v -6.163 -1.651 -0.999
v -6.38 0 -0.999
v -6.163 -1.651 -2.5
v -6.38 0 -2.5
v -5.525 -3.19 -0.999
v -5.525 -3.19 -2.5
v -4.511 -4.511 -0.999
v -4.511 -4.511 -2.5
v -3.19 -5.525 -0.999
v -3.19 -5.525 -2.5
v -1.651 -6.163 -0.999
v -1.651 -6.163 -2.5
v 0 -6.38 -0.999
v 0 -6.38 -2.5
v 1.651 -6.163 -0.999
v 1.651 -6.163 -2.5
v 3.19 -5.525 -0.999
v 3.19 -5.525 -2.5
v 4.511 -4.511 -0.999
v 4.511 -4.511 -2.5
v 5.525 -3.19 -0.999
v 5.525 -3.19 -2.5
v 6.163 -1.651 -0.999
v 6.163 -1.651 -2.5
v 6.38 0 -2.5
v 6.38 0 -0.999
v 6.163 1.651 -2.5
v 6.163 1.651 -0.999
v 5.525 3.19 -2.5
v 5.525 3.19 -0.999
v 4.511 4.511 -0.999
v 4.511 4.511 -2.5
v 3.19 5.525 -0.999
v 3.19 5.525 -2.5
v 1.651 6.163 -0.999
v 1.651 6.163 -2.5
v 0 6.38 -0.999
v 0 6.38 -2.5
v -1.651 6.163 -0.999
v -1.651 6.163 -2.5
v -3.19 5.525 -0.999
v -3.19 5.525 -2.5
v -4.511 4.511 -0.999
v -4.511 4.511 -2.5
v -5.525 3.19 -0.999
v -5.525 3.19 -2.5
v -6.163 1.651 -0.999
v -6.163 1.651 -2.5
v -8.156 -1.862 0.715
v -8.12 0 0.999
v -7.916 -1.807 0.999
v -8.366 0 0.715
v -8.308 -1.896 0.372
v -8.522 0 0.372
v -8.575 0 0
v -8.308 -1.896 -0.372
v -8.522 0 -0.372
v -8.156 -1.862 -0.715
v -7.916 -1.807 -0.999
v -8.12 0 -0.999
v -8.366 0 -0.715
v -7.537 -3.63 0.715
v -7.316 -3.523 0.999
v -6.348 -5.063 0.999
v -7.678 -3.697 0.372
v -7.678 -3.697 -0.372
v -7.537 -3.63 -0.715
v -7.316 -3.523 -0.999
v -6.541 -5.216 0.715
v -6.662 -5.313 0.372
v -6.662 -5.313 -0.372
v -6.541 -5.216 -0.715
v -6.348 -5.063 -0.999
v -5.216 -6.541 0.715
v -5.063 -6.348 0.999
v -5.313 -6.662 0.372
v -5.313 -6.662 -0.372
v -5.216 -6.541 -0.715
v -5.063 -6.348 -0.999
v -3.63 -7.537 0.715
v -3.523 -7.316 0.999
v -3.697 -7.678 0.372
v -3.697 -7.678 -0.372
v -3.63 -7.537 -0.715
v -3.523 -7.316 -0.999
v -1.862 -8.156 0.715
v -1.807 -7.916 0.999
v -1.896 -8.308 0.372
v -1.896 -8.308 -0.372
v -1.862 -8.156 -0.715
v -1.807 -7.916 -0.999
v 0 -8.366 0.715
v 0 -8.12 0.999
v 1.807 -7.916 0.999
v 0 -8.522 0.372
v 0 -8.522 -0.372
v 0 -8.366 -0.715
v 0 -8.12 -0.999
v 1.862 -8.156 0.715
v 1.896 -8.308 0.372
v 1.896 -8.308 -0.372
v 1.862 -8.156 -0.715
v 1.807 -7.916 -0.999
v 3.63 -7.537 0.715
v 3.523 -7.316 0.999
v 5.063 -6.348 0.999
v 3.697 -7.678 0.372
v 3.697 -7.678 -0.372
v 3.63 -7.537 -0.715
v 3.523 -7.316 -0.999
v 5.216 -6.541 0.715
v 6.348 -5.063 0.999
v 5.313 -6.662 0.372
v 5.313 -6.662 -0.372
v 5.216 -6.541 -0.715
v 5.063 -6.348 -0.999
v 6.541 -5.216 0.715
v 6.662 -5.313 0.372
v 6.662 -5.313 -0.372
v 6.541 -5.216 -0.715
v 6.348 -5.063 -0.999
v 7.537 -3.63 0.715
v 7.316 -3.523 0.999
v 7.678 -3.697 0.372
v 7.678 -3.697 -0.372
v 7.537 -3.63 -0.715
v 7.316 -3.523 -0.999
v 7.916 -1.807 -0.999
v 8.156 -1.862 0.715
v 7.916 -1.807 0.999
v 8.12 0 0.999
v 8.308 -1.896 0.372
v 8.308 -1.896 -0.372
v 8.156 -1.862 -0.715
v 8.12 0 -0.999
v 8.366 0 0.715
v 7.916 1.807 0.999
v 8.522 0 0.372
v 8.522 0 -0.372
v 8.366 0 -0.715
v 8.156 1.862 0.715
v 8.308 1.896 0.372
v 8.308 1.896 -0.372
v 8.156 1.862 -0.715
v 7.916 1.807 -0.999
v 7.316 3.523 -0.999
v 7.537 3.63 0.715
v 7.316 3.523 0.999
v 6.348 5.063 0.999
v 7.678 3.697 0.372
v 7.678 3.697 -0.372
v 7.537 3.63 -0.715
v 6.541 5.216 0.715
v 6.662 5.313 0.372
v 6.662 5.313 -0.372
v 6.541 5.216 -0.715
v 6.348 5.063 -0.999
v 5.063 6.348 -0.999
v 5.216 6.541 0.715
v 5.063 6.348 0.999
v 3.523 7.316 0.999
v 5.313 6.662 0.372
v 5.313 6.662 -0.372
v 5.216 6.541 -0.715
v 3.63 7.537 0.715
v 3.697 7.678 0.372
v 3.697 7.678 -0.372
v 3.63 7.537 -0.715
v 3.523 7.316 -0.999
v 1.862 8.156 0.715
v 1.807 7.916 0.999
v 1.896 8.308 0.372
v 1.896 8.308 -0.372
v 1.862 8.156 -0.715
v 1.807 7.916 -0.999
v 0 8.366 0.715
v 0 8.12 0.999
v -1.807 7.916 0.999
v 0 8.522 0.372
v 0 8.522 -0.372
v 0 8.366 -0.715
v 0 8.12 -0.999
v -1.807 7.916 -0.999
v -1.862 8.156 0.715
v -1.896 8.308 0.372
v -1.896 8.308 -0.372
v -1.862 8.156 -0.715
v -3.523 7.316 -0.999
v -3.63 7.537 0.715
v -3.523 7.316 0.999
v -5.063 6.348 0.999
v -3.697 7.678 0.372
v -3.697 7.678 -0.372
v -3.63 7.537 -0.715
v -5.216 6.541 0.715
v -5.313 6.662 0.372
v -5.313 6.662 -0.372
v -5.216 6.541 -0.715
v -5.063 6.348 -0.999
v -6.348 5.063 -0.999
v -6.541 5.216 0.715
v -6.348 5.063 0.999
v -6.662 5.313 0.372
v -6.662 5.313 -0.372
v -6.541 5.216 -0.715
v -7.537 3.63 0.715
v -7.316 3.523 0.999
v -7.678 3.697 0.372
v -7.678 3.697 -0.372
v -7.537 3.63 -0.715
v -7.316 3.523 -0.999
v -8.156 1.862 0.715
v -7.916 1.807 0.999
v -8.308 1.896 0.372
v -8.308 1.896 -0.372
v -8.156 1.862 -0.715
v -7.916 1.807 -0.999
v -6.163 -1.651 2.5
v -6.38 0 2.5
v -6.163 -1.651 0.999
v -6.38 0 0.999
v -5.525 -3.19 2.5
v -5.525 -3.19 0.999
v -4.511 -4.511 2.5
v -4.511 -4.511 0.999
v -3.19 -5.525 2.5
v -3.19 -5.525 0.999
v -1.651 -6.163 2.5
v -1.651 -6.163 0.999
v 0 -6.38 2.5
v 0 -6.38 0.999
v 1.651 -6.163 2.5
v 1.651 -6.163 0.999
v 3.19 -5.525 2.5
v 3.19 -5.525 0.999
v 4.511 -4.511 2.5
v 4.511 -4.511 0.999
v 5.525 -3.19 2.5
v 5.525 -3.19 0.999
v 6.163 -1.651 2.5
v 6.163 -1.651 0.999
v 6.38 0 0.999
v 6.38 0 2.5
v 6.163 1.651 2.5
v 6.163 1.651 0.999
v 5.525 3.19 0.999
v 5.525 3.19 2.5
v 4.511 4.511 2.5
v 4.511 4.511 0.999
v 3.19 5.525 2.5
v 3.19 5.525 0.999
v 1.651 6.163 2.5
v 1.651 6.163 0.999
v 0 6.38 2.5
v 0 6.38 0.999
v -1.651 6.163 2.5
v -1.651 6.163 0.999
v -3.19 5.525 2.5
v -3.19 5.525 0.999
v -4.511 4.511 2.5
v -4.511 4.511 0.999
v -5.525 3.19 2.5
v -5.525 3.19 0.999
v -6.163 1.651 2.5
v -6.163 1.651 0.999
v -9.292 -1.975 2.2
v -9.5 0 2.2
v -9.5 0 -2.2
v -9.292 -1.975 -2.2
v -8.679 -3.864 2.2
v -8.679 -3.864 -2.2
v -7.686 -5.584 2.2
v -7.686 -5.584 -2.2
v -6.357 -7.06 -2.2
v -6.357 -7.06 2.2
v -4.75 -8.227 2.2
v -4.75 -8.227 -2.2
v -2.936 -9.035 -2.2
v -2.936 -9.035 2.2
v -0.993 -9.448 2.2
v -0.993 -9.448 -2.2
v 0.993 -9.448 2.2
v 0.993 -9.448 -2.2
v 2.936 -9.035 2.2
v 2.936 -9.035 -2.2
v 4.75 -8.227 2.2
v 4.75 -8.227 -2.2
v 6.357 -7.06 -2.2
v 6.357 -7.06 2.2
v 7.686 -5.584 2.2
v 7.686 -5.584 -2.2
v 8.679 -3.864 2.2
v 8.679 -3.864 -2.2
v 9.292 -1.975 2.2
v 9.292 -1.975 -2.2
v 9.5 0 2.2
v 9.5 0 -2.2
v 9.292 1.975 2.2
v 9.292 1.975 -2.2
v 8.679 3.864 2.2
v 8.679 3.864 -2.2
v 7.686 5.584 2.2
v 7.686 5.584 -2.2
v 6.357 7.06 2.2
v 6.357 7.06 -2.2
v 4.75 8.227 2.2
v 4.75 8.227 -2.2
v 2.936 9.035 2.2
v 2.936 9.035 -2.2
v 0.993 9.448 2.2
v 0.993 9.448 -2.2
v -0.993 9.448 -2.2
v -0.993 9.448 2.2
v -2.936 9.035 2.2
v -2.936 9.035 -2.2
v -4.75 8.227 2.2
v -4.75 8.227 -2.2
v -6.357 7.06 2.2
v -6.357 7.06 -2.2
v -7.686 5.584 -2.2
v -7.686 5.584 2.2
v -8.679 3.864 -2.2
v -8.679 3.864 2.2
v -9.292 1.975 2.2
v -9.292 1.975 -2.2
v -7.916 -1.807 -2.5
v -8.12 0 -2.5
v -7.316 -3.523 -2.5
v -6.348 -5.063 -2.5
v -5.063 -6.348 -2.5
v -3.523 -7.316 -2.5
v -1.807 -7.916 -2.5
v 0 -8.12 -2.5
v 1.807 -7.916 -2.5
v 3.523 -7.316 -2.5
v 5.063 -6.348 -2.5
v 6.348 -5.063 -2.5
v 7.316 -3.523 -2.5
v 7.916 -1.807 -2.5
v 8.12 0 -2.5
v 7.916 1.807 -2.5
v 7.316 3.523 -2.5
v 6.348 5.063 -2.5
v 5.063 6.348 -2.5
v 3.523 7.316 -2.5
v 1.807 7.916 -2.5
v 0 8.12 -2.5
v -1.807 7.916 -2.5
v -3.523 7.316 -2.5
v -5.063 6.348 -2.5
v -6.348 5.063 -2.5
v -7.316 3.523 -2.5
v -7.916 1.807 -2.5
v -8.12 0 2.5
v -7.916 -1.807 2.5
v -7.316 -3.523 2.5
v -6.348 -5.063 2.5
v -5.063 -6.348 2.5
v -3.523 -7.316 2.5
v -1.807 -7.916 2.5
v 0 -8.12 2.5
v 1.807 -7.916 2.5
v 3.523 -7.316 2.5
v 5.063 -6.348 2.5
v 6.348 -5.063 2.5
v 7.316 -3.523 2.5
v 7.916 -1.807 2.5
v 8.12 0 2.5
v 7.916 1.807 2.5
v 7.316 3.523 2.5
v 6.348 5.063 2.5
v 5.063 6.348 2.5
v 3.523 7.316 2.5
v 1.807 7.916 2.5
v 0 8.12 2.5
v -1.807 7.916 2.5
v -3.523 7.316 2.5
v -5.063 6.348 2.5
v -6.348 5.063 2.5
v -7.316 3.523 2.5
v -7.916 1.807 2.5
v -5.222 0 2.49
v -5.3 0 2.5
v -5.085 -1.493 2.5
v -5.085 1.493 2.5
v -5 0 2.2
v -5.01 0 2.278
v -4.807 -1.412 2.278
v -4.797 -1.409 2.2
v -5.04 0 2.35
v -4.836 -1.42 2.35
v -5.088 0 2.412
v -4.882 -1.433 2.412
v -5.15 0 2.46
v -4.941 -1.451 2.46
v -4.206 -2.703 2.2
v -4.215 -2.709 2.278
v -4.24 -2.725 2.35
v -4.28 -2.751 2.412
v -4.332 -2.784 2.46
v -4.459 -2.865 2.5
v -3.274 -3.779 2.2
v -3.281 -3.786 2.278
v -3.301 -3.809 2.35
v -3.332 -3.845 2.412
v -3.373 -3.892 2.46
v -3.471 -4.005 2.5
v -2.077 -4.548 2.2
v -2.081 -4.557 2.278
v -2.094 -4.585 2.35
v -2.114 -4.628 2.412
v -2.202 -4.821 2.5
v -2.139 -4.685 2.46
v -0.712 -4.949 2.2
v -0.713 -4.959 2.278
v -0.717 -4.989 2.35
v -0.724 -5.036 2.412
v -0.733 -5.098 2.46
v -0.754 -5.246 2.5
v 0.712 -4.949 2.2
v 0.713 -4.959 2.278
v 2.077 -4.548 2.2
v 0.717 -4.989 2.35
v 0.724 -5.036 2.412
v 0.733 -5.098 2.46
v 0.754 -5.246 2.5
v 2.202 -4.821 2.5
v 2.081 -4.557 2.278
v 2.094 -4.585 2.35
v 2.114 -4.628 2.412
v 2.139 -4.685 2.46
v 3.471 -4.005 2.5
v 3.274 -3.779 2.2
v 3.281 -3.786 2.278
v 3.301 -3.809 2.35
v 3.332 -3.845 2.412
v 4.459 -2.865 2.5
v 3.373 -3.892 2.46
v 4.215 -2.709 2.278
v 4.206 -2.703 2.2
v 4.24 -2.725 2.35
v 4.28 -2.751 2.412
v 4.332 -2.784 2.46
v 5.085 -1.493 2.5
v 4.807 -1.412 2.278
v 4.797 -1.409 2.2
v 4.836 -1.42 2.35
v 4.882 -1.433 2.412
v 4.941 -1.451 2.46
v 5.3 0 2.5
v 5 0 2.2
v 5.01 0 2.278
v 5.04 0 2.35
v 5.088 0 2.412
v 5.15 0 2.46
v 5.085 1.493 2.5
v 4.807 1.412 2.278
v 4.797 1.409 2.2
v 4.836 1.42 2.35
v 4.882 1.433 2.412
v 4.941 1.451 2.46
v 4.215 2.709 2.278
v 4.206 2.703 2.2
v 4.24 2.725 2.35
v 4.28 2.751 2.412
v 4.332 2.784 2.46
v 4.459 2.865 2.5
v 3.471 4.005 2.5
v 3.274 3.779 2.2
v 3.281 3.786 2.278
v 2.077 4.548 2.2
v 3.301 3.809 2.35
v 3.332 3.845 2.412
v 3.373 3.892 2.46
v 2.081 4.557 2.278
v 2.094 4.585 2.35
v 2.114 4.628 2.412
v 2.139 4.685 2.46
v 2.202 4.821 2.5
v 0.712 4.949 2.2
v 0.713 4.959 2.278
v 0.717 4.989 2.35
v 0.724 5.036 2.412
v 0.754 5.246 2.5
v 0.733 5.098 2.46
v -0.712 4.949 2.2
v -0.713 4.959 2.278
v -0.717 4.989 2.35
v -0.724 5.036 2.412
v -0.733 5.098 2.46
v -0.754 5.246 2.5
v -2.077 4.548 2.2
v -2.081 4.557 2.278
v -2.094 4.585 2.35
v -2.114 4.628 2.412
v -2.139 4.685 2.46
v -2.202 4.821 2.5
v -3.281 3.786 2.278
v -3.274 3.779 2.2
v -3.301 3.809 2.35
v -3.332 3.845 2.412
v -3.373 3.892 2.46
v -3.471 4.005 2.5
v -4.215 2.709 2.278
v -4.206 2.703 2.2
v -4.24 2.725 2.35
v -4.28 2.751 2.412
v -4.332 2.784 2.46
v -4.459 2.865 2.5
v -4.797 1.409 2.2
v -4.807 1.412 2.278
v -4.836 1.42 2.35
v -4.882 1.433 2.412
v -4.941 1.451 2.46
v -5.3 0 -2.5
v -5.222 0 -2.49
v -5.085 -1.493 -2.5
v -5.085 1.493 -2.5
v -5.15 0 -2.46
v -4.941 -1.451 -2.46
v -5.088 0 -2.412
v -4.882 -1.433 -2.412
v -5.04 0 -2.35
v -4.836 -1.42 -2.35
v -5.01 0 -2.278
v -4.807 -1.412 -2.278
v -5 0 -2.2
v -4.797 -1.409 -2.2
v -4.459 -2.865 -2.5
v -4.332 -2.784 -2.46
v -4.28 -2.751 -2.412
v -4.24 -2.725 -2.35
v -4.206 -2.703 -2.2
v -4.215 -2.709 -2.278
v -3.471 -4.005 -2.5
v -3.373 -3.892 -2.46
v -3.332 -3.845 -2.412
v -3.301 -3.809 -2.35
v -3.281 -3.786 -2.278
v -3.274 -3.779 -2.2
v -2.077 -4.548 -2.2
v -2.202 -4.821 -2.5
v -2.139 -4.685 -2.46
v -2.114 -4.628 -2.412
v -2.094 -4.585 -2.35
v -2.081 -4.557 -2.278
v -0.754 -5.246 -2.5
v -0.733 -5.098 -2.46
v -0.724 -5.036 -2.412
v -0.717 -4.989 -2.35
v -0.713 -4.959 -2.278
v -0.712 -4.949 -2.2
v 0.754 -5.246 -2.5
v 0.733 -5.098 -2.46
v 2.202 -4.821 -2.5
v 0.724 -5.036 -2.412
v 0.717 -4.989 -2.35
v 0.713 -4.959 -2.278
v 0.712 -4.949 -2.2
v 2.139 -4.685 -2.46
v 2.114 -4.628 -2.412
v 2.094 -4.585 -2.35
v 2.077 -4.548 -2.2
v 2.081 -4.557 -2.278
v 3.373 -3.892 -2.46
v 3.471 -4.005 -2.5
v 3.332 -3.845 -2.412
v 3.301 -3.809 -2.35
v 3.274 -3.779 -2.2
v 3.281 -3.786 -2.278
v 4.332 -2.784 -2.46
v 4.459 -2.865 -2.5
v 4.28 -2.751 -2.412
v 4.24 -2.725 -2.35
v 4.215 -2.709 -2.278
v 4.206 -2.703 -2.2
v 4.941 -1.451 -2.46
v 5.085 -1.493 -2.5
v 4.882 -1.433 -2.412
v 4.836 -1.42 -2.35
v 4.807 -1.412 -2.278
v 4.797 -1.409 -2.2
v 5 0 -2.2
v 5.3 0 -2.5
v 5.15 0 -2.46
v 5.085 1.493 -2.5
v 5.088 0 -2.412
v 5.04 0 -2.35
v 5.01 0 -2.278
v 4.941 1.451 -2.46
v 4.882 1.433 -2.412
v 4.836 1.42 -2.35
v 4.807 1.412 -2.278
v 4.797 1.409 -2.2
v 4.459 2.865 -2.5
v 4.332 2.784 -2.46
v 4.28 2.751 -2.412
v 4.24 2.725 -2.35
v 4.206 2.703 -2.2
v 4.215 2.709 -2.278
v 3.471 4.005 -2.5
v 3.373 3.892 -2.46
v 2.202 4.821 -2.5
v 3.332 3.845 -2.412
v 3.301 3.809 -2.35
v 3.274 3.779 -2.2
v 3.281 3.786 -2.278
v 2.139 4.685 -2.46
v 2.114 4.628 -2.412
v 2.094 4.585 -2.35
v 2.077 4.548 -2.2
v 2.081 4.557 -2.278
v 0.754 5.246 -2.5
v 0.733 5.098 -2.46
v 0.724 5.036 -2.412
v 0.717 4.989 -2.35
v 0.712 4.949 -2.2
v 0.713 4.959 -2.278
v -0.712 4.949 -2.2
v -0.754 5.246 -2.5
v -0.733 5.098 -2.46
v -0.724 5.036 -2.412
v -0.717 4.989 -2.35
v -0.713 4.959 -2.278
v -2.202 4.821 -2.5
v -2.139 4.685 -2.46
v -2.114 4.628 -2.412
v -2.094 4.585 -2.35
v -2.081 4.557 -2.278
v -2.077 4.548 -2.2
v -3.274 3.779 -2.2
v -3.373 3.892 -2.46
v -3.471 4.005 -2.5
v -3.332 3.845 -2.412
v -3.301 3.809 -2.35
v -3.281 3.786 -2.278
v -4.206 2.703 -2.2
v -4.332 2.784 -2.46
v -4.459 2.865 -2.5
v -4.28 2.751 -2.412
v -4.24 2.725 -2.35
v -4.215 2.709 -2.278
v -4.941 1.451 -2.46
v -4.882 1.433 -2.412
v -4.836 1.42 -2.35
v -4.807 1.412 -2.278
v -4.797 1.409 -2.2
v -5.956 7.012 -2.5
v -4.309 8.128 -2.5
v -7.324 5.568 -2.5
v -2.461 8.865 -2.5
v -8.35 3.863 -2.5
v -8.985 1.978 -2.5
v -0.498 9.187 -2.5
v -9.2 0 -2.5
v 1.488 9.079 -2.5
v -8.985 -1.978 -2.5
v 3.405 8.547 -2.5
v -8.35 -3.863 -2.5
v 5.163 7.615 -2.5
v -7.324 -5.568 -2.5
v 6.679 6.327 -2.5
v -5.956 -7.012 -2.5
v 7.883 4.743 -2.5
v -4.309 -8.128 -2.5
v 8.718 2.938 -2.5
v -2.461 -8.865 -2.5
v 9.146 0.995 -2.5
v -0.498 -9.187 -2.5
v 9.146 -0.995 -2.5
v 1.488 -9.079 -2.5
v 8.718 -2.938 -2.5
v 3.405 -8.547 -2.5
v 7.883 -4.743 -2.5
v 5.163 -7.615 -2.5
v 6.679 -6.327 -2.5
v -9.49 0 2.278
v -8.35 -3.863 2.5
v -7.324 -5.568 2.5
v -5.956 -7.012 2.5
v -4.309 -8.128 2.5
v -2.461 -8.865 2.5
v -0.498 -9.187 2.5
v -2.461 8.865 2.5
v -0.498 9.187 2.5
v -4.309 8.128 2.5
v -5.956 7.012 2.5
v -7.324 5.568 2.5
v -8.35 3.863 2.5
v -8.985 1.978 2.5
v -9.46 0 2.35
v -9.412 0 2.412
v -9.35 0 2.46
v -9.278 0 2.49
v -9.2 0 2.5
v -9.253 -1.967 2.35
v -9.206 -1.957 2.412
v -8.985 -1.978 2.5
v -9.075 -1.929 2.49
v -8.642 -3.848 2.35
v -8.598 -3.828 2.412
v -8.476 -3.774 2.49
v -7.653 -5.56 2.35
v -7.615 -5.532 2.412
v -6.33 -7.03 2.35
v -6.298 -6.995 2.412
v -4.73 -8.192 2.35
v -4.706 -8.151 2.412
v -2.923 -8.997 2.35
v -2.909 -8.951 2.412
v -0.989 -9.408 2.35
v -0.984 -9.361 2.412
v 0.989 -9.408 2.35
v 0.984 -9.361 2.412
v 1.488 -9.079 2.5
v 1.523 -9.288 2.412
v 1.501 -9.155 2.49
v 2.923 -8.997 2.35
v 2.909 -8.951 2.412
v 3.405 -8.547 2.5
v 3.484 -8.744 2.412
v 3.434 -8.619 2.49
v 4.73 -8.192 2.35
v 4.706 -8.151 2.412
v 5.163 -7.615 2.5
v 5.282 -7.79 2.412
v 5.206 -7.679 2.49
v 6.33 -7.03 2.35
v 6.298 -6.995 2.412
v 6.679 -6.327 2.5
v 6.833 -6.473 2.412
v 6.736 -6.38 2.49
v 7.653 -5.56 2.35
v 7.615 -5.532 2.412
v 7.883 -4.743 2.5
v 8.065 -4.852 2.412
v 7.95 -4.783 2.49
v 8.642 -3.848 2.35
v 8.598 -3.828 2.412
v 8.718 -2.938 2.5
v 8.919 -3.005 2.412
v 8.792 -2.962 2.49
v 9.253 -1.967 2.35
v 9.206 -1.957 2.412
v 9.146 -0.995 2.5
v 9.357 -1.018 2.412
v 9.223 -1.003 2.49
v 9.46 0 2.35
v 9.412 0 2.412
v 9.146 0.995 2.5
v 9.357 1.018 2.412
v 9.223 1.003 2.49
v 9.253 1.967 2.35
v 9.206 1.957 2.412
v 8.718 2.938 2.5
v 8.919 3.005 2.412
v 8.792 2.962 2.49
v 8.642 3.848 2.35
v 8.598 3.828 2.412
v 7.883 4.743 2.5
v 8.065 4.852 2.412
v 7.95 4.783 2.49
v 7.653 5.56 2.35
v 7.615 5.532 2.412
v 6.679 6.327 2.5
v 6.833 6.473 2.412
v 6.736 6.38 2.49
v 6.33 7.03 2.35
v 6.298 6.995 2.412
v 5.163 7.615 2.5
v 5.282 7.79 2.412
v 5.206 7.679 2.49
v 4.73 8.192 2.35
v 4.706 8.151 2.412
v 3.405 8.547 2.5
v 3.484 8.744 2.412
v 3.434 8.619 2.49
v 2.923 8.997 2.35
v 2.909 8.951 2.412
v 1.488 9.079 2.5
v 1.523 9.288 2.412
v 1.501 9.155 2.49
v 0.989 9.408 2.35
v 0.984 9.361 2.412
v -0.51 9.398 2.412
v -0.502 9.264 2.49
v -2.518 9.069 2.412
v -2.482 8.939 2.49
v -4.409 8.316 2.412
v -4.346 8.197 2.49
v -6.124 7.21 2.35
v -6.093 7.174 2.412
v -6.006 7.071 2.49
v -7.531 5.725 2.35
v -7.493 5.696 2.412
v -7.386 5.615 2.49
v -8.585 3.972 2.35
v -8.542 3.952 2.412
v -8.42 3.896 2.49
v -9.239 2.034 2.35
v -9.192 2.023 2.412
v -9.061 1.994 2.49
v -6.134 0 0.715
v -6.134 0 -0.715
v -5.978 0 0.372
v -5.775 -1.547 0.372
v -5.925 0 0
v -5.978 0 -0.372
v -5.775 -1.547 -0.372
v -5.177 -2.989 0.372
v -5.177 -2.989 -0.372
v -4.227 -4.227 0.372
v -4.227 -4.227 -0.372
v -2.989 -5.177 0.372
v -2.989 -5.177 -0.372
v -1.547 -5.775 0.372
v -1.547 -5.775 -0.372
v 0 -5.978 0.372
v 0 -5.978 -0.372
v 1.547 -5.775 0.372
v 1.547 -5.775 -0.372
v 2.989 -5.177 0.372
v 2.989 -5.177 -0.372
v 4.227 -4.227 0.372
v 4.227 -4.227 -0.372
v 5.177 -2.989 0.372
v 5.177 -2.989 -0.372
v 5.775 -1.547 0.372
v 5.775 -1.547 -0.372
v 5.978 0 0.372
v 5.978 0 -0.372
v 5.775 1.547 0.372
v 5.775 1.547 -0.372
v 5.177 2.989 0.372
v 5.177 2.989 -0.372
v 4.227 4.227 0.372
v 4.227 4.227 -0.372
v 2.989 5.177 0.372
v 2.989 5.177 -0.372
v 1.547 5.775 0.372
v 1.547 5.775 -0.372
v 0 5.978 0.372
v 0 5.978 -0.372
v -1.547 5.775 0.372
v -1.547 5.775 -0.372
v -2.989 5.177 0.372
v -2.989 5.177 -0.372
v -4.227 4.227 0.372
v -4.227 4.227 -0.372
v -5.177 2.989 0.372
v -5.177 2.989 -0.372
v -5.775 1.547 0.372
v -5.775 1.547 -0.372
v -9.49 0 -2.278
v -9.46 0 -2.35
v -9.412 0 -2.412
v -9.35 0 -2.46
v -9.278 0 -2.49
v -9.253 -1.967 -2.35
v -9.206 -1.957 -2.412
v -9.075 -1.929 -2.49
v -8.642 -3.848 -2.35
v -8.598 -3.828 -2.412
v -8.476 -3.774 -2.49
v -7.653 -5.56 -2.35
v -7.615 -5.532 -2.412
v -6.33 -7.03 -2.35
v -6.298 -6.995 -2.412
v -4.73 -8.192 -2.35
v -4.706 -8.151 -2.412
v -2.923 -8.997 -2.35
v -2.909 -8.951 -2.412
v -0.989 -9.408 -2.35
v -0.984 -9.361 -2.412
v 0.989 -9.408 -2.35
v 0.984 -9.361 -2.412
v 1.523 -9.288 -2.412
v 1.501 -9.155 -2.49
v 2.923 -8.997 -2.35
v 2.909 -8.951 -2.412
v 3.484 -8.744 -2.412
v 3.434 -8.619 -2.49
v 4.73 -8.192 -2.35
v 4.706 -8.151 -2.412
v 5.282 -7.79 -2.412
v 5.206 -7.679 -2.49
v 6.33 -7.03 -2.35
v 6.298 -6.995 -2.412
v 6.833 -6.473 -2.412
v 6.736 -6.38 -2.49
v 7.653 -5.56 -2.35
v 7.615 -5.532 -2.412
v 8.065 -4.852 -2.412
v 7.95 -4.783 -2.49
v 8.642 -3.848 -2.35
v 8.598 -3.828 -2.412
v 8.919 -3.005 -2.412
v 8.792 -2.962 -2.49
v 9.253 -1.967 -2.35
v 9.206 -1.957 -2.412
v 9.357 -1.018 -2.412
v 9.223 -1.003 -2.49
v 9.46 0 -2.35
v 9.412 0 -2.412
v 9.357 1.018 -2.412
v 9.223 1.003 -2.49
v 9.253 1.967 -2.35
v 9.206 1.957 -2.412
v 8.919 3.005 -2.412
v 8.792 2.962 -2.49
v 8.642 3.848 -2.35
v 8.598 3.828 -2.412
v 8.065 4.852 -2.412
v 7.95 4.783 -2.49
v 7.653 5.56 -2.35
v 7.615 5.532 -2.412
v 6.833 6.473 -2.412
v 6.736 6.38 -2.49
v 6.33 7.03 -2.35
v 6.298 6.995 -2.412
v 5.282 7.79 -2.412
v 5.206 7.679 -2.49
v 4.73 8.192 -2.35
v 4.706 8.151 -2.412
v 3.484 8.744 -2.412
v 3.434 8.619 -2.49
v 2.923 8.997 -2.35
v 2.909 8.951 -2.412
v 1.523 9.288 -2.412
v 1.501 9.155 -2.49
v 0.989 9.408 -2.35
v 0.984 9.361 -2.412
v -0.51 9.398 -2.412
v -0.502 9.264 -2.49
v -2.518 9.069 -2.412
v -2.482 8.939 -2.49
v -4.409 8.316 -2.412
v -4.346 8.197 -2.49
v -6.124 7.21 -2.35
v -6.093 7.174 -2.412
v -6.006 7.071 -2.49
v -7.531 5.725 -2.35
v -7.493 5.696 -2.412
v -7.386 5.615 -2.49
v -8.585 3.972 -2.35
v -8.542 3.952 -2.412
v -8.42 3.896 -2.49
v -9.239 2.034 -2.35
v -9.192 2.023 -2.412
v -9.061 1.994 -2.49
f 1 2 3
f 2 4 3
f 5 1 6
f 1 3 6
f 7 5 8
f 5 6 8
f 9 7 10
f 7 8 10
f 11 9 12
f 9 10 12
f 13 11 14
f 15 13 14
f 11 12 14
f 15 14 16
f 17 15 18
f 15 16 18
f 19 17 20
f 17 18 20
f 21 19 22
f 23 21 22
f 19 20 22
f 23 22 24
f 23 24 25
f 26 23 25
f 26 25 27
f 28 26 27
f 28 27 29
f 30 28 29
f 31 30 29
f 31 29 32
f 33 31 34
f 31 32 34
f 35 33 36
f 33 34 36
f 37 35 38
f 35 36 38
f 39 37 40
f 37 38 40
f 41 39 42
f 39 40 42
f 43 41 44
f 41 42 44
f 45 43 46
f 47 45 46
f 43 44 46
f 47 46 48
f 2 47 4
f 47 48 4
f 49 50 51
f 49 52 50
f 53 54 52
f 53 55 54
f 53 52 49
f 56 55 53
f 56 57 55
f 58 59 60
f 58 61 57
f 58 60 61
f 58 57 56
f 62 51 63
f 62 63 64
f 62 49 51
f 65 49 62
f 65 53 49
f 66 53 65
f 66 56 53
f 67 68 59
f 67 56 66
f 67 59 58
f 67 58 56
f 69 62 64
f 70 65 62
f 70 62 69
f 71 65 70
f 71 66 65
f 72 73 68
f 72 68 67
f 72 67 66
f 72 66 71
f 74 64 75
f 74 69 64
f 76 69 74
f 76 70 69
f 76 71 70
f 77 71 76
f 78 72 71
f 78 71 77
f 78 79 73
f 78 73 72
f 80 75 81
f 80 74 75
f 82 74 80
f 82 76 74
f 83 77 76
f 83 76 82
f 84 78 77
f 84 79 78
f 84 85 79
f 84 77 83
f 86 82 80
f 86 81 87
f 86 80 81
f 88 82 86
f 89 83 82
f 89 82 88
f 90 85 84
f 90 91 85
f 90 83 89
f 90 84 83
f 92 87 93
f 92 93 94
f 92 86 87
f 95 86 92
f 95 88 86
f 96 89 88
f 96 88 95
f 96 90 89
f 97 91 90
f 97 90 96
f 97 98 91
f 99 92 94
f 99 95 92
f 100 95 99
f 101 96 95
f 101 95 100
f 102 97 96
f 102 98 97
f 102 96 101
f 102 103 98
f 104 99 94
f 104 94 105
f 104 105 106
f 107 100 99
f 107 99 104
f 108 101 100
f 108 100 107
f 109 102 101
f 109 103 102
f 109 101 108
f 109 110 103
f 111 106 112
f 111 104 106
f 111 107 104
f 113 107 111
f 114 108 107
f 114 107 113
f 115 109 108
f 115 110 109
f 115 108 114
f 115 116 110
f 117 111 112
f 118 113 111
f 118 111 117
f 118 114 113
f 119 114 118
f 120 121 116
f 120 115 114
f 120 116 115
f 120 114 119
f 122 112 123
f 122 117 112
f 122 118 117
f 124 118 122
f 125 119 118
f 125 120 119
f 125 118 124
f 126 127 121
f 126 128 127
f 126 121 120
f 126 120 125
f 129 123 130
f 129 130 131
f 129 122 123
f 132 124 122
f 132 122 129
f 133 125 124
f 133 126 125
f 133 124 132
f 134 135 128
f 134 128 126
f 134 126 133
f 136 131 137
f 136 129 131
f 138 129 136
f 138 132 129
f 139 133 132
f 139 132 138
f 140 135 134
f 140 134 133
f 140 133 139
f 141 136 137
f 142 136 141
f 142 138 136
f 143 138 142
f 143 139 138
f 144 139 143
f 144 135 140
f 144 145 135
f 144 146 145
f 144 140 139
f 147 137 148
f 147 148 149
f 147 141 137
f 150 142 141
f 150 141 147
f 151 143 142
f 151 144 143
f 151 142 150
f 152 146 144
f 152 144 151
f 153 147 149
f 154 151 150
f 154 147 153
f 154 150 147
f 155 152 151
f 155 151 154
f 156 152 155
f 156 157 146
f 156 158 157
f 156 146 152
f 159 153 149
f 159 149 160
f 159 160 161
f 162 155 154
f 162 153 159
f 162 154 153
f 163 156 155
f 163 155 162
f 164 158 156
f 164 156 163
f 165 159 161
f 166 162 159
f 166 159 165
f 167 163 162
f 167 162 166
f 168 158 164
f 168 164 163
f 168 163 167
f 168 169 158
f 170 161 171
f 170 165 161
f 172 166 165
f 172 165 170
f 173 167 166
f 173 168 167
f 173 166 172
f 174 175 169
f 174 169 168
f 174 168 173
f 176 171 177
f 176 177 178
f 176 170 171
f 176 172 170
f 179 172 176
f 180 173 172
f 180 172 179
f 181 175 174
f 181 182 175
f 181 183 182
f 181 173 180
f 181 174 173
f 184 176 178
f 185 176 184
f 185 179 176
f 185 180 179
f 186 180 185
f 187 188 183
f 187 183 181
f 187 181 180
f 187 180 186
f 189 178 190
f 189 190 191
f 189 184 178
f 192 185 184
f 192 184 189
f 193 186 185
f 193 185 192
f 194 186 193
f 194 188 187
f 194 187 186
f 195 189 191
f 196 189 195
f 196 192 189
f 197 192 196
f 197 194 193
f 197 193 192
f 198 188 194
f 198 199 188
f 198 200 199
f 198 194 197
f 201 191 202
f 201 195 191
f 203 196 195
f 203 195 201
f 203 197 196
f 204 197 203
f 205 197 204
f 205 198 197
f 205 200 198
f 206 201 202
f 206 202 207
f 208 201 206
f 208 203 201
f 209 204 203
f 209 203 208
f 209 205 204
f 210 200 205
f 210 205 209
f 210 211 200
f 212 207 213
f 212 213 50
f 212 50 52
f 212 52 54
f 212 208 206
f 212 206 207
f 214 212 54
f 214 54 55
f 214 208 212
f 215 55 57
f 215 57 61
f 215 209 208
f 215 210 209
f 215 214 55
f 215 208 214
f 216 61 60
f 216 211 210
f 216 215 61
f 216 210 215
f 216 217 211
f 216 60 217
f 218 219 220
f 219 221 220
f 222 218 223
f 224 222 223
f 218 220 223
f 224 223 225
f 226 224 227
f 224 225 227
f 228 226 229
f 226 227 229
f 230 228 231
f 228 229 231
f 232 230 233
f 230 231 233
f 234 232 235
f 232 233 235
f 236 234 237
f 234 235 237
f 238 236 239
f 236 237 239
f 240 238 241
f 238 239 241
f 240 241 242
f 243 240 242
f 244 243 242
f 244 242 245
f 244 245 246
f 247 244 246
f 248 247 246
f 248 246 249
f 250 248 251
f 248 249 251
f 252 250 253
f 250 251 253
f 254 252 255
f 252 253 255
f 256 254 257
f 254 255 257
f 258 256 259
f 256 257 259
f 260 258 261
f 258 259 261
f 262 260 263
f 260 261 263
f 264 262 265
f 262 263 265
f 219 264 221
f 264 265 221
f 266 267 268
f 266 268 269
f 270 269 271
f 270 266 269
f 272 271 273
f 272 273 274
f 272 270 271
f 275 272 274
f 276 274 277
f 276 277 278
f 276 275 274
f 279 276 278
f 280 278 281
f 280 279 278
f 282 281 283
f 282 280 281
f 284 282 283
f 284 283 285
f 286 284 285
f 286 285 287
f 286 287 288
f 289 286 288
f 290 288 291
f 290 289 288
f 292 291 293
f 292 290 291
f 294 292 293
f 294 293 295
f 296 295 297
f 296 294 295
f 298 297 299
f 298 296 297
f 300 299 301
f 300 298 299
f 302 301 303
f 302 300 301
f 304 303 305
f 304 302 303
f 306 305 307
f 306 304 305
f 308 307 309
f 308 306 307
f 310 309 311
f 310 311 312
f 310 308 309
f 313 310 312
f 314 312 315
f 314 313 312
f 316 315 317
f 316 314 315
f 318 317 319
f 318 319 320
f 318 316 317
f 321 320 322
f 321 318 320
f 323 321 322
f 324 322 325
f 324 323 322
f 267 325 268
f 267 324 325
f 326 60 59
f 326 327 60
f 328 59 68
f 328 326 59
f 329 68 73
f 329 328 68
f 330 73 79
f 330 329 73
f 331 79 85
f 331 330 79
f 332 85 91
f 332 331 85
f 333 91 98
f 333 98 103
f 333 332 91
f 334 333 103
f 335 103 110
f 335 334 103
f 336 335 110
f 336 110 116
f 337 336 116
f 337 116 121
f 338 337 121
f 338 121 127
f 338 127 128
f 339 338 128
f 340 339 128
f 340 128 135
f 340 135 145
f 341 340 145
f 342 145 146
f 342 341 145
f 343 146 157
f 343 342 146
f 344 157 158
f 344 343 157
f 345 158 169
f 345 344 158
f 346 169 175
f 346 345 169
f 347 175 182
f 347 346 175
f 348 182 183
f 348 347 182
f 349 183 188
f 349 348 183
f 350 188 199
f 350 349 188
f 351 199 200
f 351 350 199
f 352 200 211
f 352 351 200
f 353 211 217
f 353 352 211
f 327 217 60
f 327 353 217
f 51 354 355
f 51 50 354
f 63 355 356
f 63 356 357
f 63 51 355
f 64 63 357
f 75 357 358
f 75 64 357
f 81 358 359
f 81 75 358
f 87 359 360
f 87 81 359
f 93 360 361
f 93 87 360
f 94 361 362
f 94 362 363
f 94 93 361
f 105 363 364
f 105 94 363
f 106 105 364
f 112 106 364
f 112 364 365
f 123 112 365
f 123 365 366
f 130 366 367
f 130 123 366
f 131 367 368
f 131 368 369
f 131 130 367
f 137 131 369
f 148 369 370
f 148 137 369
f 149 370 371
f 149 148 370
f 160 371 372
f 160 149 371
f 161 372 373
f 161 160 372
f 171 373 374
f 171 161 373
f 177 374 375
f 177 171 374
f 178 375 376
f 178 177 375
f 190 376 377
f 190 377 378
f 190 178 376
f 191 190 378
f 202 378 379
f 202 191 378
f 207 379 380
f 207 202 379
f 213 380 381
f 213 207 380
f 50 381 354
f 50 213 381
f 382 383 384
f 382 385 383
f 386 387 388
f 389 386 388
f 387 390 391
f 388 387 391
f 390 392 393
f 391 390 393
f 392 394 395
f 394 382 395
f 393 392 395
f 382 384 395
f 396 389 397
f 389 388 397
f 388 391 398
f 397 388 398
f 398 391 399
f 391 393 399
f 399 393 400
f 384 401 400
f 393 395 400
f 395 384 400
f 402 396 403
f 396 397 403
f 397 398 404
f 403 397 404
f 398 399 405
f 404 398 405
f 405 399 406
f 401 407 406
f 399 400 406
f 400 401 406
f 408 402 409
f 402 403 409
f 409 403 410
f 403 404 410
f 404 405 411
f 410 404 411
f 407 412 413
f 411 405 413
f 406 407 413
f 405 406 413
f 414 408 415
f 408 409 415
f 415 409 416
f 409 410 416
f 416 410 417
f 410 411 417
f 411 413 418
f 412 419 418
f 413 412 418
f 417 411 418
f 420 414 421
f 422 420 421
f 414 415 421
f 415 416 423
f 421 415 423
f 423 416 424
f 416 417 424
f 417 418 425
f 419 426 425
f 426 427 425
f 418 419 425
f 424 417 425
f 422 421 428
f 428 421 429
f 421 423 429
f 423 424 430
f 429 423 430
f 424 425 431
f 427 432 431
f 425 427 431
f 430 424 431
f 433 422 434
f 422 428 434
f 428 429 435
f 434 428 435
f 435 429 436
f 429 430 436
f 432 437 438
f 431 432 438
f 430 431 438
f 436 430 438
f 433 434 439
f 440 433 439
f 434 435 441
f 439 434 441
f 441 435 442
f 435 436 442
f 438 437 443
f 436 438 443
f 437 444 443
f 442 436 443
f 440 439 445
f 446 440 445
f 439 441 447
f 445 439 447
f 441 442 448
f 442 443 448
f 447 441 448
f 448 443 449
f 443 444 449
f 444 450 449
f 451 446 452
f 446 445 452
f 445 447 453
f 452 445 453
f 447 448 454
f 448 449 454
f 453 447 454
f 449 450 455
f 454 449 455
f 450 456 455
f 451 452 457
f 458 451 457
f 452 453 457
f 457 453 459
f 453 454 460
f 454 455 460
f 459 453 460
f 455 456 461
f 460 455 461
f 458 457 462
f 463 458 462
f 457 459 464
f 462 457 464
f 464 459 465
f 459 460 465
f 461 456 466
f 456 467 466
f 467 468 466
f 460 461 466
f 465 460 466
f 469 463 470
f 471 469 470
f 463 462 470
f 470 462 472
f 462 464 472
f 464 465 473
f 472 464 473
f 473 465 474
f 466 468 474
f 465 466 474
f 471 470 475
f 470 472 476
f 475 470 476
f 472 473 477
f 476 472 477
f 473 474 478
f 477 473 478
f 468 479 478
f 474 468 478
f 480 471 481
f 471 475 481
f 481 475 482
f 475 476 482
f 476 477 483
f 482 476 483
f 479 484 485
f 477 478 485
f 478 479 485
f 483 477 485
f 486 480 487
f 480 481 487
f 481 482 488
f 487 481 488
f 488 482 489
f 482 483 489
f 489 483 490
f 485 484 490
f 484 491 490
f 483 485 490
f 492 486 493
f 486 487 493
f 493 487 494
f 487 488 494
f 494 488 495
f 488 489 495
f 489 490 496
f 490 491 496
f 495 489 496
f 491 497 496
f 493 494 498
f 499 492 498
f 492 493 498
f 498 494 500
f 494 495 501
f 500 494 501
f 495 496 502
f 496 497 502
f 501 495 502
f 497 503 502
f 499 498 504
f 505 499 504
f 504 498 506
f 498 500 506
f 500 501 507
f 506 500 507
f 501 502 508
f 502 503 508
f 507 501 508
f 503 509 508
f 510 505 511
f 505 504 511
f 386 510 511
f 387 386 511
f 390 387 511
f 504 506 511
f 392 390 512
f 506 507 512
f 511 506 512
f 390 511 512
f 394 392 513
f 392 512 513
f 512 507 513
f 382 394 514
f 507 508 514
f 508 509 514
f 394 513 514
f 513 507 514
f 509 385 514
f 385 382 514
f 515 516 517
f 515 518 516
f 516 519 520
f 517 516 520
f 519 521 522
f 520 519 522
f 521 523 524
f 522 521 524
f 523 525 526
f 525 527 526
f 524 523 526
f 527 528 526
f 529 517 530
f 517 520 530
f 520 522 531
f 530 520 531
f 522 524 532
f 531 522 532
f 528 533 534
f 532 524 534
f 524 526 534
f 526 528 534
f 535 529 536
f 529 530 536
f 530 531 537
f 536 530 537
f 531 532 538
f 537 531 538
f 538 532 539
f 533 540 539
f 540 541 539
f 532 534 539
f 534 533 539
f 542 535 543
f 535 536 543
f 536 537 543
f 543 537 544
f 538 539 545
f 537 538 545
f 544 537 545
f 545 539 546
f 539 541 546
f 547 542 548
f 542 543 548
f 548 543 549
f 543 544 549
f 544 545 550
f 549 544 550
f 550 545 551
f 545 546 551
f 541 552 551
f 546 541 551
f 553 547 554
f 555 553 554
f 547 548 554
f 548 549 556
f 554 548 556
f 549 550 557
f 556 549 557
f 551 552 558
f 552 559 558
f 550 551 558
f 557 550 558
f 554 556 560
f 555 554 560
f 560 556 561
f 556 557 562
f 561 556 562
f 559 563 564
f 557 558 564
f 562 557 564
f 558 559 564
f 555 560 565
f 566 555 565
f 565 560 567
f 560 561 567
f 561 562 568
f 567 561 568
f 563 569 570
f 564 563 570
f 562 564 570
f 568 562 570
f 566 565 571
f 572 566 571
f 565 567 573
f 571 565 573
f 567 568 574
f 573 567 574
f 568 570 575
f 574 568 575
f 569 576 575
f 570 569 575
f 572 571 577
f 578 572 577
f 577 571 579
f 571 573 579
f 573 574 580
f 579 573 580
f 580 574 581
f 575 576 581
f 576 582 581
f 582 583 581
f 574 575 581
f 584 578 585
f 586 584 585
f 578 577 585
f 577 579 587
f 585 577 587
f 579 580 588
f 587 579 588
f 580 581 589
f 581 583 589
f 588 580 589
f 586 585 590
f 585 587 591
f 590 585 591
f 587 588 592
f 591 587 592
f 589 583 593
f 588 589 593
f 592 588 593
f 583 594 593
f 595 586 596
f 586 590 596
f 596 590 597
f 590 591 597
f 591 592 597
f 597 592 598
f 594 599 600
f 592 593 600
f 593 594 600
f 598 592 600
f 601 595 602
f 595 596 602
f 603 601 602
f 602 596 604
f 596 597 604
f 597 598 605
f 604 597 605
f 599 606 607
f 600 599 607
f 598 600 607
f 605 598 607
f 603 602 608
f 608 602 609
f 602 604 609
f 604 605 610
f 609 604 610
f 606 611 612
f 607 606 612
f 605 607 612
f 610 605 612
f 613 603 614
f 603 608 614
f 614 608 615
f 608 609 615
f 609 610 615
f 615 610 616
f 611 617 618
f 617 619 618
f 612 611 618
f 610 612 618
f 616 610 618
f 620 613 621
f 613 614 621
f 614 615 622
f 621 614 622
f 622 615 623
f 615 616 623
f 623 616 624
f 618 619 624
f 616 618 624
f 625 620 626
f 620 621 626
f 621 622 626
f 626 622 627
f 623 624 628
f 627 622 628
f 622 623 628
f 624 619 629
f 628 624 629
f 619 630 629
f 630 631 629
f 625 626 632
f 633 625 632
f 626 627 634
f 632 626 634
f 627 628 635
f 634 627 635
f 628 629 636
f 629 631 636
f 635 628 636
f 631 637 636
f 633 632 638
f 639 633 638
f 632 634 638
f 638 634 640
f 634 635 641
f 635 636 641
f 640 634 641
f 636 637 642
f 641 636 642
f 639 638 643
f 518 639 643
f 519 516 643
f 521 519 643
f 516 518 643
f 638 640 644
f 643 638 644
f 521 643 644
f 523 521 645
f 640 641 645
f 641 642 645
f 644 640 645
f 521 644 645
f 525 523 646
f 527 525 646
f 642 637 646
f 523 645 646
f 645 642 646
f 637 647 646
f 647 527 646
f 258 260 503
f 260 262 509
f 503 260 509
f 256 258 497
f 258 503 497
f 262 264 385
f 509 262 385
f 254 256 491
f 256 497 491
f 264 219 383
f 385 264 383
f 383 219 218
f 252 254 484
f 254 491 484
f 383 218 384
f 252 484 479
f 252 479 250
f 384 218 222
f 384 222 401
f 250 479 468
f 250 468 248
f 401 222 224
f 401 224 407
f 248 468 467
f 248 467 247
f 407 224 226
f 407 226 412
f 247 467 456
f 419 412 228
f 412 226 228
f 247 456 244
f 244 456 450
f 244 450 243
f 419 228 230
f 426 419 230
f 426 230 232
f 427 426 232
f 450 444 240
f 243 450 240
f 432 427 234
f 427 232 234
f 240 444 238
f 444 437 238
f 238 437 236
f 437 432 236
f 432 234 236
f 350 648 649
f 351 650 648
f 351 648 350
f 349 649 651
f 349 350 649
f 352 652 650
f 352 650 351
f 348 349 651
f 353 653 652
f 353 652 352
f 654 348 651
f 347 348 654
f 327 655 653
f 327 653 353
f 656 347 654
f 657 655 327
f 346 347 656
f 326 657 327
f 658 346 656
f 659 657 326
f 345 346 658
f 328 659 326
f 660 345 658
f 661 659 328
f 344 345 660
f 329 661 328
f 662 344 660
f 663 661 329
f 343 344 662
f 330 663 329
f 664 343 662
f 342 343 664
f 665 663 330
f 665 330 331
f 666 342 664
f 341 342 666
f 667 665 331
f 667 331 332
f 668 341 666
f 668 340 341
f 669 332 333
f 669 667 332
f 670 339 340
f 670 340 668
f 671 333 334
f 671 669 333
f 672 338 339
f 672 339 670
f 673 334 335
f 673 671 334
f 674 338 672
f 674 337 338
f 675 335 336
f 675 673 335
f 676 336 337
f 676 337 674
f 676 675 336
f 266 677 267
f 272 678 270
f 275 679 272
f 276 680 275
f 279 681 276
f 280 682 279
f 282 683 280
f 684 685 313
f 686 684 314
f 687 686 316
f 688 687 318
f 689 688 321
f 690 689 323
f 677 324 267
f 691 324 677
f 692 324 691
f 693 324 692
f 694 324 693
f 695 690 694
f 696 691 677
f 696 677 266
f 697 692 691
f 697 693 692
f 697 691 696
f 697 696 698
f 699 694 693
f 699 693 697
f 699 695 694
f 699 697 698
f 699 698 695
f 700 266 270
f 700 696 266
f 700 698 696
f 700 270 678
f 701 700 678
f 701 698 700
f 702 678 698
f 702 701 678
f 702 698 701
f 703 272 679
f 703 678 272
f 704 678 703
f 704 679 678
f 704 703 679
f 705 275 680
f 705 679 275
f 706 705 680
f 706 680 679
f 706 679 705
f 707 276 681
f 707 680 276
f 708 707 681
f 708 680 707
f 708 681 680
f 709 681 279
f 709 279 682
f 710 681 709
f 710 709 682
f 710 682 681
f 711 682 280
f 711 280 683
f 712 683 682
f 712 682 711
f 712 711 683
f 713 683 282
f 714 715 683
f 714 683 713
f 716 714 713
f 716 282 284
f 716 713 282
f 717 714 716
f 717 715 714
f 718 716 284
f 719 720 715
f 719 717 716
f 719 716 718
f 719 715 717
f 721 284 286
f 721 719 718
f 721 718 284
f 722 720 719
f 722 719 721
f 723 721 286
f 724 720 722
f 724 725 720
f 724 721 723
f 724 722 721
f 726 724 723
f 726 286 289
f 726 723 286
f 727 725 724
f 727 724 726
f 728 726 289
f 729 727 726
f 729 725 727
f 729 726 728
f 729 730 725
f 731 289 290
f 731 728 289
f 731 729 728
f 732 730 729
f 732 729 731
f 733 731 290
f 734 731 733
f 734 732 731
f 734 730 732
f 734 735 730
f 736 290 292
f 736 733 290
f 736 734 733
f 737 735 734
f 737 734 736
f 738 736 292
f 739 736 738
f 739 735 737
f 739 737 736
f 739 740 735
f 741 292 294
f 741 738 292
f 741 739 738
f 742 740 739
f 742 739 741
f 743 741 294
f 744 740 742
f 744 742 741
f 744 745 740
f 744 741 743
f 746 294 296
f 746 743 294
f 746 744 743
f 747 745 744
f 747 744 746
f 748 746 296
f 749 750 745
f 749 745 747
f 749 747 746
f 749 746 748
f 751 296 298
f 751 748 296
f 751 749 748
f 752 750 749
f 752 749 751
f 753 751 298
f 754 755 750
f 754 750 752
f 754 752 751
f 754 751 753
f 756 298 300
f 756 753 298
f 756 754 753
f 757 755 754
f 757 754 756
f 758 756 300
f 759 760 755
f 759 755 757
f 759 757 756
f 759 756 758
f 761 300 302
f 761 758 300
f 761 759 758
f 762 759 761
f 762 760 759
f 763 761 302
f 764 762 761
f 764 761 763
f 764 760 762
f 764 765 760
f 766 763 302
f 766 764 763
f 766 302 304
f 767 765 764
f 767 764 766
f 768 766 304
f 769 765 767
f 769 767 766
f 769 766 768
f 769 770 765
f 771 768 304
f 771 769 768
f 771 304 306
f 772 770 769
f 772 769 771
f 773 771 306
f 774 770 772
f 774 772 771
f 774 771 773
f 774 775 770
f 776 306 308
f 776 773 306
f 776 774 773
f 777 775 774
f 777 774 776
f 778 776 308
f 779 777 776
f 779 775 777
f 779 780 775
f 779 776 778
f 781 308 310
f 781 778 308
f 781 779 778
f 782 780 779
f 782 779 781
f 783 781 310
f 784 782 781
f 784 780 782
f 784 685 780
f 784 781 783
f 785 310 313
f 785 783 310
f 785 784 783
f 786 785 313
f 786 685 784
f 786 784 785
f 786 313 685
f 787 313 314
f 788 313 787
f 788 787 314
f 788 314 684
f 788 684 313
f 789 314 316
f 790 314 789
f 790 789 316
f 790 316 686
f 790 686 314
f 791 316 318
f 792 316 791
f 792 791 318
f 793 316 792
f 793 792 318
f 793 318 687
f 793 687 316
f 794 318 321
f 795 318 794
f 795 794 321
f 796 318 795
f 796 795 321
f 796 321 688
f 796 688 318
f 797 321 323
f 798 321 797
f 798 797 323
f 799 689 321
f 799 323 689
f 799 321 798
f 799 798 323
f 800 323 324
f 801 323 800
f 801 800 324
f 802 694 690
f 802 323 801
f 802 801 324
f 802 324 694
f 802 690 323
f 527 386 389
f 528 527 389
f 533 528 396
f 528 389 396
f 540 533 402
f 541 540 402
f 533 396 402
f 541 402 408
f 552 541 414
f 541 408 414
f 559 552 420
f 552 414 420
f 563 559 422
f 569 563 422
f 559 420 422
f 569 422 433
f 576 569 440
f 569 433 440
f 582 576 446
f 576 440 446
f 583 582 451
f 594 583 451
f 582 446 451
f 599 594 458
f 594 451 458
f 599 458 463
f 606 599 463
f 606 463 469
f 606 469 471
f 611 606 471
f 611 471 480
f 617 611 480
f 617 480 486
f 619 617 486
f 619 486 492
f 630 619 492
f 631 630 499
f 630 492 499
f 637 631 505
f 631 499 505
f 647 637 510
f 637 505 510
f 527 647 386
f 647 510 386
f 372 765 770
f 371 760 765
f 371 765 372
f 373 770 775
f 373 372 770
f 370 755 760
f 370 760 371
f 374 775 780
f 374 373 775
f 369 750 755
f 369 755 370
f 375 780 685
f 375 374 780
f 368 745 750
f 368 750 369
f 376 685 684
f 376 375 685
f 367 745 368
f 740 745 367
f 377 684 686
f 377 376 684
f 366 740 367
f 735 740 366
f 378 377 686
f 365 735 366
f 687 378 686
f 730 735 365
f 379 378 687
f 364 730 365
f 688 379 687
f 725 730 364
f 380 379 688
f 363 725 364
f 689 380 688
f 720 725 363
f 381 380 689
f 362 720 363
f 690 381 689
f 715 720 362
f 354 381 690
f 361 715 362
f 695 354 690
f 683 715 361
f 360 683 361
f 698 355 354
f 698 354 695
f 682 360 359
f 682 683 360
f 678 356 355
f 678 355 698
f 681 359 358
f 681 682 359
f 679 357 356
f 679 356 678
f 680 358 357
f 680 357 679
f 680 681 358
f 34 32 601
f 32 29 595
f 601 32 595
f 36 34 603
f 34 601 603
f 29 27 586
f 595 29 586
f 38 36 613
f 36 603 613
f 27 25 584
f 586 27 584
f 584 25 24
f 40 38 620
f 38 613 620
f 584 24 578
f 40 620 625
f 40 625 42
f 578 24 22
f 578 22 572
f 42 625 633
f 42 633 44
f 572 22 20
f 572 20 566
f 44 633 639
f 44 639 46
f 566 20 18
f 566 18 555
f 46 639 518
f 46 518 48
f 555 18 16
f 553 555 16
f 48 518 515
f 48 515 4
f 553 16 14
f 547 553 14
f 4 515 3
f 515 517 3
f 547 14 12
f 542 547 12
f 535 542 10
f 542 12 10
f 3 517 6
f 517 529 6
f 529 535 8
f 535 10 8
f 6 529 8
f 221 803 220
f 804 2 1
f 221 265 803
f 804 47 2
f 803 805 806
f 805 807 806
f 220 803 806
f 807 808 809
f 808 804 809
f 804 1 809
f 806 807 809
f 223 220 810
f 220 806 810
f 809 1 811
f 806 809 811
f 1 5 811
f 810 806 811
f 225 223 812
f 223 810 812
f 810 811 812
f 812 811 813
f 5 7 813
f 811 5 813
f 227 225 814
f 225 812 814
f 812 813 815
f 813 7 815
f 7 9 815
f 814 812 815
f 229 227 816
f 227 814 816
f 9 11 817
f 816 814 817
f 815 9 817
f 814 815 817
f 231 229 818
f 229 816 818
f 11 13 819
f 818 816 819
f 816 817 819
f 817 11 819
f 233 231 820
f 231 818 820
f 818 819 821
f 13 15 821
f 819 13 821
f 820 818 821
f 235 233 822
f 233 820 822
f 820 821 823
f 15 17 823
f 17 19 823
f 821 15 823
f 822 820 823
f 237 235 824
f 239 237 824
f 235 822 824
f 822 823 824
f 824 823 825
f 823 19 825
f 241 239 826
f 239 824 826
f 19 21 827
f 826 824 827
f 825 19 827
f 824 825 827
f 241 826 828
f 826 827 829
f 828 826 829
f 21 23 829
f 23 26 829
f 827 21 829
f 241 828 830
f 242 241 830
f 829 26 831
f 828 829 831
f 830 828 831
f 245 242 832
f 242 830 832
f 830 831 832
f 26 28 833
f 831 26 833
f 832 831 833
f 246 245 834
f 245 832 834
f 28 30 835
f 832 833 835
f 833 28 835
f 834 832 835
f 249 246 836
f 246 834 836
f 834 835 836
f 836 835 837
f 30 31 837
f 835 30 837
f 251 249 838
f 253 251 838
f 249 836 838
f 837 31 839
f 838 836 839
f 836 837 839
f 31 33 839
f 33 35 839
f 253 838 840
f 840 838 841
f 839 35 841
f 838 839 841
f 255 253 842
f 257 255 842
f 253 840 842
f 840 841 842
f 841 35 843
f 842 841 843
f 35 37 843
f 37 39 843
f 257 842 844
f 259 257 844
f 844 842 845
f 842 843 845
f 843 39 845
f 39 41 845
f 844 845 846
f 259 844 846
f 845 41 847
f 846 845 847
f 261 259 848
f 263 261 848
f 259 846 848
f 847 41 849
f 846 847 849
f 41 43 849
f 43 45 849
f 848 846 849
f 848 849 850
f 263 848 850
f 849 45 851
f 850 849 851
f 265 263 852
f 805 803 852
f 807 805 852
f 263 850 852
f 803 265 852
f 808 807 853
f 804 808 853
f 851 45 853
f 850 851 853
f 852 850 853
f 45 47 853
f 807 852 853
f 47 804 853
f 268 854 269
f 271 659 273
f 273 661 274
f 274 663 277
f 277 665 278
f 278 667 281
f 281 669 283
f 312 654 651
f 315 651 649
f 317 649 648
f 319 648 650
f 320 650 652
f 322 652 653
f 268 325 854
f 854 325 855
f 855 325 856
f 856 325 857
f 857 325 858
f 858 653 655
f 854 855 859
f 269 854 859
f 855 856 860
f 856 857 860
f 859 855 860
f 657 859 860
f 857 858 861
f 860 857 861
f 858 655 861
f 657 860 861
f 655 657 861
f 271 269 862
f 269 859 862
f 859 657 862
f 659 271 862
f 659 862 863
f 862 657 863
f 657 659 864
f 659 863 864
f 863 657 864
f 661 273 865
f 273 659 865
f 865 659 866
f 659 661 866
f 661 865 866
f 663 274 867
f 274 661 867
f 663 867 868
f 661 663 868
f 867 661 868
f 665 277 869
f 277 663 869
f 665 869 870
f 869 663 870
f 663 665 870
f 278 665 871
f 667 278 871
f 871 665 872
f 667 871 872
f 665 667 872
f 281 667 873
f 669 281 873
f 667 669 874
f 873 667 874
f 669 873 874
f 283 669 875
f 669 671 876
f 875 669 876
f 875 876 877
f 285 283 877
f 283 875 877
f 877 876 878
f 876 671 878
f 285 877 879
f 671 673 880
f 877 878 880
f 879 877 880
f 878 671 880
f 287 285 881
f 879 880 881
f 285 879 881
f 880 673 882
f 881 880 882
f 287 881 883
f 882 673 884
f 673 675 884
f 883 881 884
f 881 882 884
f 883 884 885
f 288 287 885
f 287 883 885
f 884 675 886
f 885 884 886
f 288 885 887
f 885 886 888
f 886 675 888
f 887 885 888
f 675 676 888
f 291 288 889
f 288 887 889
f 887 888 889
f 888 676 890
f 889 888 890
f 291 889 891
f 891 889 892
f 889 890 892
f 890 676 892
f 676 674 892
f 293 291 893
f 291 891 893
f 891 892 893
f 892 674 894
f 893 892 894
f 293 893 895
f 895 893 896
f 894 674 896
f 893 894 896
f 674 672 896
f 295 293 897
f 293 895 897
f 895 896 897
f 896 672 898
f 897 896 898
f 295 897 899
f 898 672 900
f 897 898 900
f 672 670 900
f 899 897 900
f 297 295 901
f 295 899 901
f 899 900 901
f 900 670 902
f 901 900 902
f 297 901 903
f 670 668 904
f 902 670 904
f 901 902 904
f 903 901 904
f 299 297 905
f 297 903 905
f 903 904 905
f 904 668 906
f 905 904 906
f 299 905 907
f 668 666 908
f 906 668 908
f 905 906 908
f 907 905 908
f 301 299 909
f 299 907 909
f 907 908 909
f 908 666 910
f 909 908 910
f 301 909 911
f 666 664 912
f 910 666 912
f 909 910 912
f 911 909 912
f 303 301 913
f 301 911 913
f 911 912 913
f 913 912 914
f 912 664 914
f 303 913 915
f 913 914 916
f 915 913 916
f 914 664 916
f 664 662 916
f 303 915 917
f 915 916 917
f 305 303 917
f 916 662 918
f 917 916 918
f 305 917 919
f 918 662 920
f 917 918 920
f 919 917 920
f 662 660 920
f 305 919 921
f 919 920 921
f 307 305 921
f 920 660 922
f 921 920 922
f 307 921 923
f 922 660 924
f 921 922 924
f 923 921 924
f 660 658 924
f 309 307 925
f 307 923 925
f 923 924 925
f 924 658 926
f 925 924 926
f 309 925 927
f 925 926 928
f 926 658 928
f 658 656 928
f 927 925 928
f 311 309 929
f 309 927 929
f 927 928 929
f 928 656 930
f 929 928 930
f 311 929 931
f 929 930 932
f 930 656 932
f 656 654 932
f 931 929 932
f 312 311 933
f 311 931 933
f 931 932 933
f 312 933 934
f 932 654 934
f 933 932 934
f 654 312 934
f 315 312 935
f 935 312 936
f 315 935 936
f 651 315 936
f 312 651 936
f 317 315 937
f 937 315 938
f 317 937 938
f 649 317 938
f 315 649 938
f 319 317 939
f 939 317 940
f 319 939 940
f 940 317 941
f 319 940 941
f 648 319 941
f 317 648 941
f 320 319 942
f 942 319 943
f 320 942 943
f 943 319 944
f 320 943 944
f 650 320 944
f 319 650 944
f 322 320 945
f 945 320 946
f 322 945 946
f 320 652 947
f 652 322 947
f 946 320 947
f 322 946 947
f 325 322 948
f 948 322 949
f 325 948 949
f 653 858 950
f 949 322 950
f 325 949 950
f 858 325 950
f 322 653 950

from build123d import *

# Parameters (mm, degrees)
FILLET_1_R = 0.3
FILLET_2_R = 0.3


with BuildPart() as part:
    # 草图1 → 旋转1 (revolve)
    with BuildSketch(Plane(origin=(0, 0, 0), x_dir=(1, 0, 0), z_dir=(0, 1, 0)), mode=Mode.PRIVATE) as revolve_1_sk:
        with BuildLine():
            Line((6.38, -2.5), (6.38, -0.999362297))
            ThreePointArc((6.38, -0.999362297), (5.925, 0), (6.38, 0.999362297))
            Line((6.38, 0.999362297), (6.38, 2.5))
            Line((6.38, 2.5), (5, 2.5))
            Line((5, 2.5), (5, -2.5))
            Line((5, -2.5), (6.38, -2.5))
        make_face()
        with BuildLine():
            Line((9.5, 2.5), (9.5, -2.5))
            Line((9.5, -2.5), (8.12, -2.5))
            Line((8.12, -2.5), (8.12, -0.999362297))
            ThreePointArc((8.12, -0.999362297), (8.575, 0), (8.12, 0.999362297))
            Line((8.12, 0.999362297), (8.12, 2.5))
            Line((8.12, 2.5), (9.5, 2.5))
        make_face()
    revolve(revolve_1_sk.sketch.rotate(Axis((0, 0, -11.486025173), (0, 0, 1)), 180), axis=Axis((0, 0, -11.486025173), (0, 0, 1)))

    # 圆角1
    fillet_1_edges = [part.edges().sort_by_distance(p)[0] for p in [
        (9.5, 0, -2.5),
        (9.5, 0, 2.5),
    ]]
    fillet(fillet_1_edges, radius=FILLET_1_R)

    # 圆角2
    fillet_2_edges = [part.edges().sort_by_distance(p)[0] for p in [
        (5, 0, -2.5),
        (5, 0, 2.5),
    ]]
    fillet(fillet_2_edges, radius=FILLET_2_R)


solid = part.part
